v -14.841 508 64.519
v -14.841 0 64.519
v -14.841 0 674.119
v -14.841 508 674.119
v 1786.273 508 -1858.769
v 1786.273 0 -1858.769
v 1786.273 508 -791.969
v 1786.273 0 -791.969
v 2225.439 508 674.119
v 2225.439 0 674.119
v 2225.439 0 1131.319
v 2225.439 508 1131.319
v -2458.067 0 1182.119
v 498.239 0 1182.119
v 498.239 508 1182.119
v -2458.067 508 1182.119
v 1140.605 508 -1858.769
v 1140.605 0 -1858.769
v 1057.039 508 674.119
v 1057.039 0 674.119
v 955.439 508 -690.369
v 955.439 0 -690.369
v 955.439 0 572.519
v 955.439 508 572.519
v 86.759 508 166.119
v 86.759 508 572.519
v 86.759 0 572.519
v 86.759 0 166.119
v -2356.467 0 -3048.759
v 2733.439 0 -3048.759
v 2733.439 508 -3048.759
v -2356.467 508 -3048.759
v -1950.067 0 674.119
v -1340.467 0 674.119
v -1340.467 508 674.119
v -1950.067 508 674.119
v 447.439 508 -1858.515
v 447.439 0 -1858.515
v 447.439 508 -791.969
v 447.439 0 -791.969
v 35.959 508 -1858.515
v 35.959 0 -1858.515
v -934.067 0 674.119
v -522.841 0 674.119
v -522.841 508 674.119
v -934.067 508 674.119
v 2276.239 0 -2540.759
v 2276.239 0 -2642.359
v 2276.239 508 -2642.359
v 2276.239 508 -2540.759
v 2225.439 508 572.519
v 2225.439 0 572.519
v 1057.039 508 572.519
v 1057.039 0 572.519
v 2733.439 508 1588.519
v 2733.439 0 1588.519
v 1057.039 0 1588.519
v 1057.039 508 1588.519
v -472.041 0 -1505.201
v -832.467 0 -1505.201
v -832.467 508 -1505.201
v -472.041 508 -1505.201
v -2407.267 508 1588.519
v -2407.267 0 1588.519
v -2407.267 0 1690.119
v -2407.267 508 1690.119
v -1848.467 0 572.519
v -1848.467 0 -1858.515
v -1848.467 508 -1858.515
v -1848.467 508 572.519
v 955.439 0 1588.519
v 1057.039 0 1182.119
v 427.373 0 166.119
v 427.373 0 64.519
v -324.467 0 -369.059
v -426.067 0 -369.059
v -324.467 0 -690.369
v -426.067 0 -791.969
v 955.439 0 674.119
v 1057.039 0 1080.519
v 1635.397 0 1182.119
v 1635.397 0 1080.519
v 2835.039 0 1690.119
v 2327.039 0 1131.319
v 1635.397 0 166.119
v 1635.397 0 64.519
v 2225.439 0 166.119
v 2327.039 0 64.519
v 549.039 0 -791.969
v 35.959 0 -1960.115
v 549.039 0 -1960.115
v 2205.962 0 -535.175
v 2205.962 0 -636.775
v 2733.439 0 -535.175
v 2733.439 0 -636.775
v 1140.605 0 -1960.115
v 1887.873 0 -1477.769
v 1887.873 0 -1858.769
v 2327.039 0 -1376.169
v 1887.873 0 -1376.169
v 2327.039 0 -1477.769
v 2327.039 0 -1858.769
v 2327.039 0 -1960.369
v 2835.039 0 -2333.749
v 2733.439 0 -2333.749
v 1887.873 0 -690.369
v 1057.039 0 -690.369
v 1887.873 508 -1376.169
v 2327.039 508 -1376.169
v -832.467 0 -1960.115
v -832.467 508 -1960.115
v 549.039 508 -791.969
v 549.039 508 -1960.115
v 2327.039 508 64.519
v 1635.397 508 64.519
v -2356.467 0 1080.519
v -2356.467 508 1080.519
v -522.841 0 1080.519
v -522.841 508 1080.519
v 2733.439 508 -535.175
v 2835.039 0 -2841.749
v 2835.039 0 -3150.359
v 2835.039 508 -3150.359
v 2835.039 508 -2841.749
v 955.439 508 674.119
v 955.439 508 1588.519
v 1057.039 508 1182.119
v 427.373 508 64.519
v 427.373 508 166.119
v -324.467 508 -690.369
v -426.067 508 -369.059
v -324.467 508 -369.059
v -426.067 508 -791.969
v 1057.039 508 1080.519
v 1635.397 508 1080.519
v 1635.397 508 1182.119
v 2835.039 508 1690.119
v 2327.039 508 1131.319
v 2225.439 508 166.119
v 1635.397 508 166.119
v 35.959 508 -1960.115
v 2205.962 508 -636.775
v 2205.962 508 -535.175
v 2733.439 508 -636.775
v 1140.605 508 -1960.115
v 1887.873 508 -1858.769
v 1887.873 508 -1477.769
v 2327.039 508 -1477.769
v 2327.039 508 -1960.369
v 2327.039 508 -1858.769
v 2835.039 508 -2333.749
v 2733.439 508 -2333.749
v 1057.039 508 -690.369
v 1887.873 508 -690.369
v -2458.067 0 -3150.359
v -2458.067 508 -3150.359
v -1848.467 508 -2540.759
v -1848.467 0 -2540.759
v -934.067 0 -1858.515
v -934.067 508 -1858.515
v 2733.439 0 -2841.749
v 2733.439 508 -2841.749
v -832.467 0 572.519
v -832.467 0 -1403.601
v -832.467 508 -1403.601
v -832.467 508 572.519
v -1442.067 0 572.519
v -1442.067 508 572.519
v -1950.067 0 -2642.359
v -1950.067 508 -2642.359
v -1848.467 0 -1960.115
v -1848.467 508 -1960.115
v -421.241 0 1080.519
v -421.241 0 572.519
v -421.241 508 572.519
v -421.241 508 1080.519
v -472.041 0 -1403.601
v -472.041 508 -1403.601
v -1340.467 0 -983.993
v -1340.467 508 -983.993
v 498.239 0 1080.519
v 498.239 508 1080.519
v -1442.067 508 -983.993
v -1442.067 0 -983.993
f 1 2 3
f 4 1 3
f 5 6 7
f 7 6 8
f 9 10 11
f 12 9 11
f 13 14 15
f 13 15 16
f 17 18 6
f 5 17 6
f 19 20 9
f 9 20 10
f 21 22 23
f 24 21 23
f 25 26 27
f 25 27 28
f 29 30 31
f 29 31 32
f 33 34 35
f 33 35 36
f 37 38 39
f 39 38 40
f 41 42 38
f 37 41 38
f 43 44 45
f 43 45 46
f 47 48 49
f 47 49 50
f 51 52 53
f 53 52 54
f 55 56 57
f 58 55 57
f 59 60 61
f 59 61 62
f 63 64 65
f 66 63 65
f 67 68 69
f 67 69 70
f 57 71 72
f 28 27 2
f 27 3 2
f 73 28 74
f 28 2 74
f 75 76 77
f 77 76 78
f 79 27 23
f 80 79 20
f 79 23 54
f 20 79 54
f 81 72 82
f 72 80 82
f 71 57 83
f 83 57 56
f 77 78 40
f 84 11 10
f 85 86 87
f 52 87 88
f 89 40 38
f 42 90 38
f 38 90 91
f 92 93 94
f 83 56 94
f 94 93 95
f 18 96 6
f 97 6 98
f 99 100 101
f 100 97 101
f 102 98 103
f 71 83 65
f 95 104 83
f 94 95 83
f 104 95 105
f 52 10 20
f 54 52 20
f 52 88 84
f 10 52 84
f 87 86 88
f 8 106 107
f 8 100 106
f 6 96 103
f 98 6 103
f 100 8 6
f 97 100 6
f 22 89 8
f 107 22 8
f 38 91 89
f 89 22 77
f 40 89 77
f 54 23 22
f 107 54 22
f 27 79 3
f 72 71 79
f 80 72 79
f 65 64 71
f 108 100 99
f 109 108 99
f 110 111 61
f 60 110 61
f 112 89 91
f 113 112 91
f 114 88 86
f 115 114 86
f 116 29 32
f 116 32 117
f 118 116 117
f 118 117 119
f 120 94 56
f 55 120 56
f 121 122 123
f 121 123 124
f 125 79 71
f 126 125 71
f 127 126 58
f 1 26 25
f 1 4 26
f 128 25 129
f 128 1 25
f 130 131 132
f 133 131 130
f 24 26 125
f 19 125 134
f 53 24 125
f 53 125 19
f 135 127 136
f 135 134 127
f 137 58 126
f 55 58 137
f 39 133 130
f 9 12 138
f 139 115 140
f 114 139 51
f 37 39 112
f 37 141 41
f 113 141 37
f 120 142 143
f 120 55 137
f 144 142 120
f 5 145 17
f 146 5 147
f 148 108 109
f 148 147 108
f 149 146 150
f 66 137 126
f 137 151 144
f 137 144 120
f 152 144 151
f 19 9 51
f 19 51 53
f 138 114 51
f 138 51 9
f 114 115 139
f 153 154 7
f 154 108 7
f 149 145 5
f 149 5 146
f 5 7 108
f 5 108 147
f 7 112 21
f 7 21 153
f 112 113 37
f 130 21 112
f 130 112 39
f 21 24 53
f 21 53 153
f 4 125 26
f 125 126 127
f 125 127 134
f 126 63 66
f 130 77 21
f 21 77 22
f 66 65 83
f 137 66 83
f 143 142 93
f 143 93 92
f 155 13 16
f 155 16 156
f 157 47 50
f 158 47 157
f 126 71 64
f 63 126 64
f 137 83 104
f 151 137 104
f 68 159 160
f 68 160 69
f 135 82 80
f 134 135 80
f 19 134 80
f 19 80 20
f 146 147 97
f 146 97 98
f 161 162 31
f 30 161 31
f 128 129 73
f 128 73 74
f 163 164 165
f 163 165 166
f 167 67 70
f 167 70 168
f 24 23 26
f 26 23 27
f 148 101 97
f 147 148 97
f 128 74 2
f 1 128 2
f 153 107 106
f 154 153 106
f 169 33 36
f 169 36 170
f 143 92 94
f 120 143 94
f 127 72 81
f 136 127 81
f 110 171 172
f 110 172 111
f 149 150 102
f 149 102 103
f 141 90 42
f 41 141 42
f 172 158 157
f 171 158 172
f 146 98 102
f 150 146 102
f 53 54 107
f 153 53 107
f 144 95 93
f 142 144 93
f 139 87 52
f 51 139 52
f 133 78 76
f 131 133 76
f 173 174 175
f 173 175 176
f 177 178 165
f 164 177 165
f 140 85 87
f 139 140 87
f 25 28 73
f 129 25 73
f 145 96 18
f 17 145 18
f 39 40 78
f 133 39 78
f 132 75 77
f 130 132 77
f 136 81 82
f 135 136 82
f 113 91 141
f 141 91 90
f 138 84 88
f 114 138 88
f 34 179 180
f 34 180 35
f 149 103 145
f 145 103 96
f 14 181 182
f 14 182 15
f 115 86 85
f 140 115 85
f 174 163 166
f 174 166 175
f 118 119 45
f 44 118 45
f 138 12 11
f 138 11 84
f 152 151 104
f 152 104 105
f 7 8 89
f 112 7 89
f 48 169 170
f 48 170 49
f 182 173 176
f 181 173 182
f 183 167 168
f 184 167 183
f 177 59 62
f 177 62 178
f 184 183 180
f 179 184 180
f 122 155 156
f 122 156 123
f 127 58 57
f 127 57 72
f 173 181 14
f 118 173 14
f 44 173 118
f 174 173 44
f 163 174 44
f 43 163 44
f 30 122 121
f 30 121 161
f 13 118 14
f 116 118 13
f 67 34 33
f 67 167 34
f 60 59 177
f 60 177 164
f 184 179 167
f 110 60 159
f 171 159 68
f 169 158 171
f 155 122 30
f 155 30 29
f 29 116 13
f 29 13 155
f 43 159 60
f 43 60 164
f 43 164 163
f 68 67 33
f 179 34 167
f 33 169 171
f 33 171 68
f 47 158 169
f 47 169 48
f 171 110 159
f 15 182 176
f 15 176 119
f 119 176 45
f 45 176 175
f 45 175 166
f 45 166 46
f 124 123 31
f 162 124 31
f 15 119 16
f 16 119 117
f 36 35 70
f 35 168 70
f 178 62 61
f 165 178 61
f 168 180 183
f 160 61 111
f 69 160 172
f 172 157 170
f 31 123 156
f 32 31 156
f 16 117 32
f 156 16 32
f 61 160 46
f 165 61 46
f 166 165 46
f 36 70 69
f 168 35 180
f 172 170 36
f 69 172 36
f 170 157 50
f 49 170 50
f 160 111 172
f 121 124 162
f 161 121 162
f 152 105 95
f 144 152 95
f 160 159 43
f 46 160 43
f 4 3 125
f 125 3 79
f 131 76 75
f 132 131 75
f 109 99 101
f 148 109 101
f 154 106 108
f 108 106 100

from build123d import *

# Parameters (mm, degrees)
BOSS_EXTRUDE1_DEPTH = 508
BOSS_EXTRUDE2_DEPTH = 508


with BuildPart() as part:
    # Sketch1 → Boss-Extrude1 (new body)
    with BuildSketch(Plane(origin=(0, 0, 0), x_dir=(1, 0, 0), z_dir=(0, 1, 0))):
        Polygon((-2407.2669152, -1690.1194544), (2835.0390848, -1690.1194544), (2835.0390848, 2333.7485456), (2733.4390848, 2333.7485456), (2733.4390848, 636.7745456), (2205.9623648, 636.7745456), (2205.9623648, 535.1745456), (2733.4390848, 535.1745456), (2733.4390848, -1588.5194544), (1057.0390848, -1588.5194544), (1057.0390848, -1182.1194544), (1635.3970848, -1182.1194544), (1635.3970848, -1080.5194544), (1057.0390848, -1080.5194544), (1057.0390848, -674.1194544), (2225.4390848, -674.1194544), (2225.4390848, -1131.3194544), (2327.0390848, -1131.3194544), (2327.0390848, -64.5194544), (1635.3970848, -64.5194544), (1635.3970848, -166.1194544), (2225.4390848, -166.1194544), (2225.4390848, -572.5194544), (1057.0390848, -572.5194544), (1057.0390848, 690.3685456), (1887.8730848, 690.3685456), (1887.8730848, 1376.1685456), (2327.0390848, 1376.1685456), (2327.0390848, 1477.7685456), (1887.8730848, 1477.7685456), (1887.8730848, 1858.7685456), (2327.0390848, 1858.7685456), (2327.0390848, 1960.3685456), (1140.6050848, 1960.1145456), (1140.6050848, 1858.7685456), (1786.2730848, 1858.7685456), (1786.2730848, 791.9685456), (549.0390848, 791.9685456), (549.0390848, 1960.1145456), (35.9590848, 1960.1145456), (35.9590848, 1858.5145456), (447.4390848, 1858.5145456), (447.4390848, 791.9685456), (-426.0669152, 791.9685456), (-426.0669152, 369.0585456), (-324.4669152, 369.0585456), (-324.4669152, 690.3685456), (955.4390848, 690.3685456), (955.4390848, -572.5194544), (86.7590848, -572.5194544), (86.7590848, -166.1194544), (427.3730848, -166.1194544), (427.3730848, -64.5194544), (-14.8409152, -64.5194544), (-14.8409152, -674.1194544), (955.4390848, -674.1194544), (955.4390848, -1588.5194544), (-2407.2669152, -1588.5194544), align=None)
    extrude(amount=BOSS_EXTRUDE1_DEPTH)


with BuildPart() as body_2:
    # Sketch1<3> → Boss-Extrude2 (new body)
    with BuildSketch(Plane(origin=(0, 0, 0), x_dir=(1, 0, 0), z_dir=(0, 1, 0))):
        Polygon((498.2390848, -1182.1194544), (-2458.0669152, -1182.1194544), (-2458.0669152, 3150.3585456), (2835.0390848, 3150.3585456), (2835.0390848, 2841.7485456), (2733.4390848, 2841.7485456), (2733.4390848, 3048.7585456), (-2356.4669152, 3048.7585456), (-2356.4669152, -1080.5194544), (-522.8409152, -1080.5194544), (-522.8409152, -674.1194544), (-934.0669152, -674.1194544), (-934.0669152, 1454.4005456), (-934.0669152, 1858.5145456), (-1848.4669152, 1858.5145456), (-1848.4669152, -572.5194544), (-1442.0669152, -572.5194544), (-1442.0669152, 983.9925456), (-1340.4669152, 983.9925456), (-1340.4669152, -674.1194544), (-1950.0669152, -674.1194544), (-1950.0669152, 2642.3585456), (2276.2390848, 2642.3585456), (2276.2390848, 2540.7585456), (-1848.4669152, 2540.7585456), (-1848.4669152, 1960.1145456), (-832.4669152, 1960.1145456), (-832.4669152, 1505.2005456), (-472.0409152, 1505.2005456), (-472.0409152, 1403.6005456), (-832.4669152, 1403.6005456), (-832.4669152, -572.5194544), (-421.2409152, -572.5194544), (-421.2409152, -1080.5194544), (498.2390848, -1080.5194544), align=None)
    extrude(amount=BOSS_EXTRUDE2_DEPTH)


solid = Compound([part.part, body_2.part])
